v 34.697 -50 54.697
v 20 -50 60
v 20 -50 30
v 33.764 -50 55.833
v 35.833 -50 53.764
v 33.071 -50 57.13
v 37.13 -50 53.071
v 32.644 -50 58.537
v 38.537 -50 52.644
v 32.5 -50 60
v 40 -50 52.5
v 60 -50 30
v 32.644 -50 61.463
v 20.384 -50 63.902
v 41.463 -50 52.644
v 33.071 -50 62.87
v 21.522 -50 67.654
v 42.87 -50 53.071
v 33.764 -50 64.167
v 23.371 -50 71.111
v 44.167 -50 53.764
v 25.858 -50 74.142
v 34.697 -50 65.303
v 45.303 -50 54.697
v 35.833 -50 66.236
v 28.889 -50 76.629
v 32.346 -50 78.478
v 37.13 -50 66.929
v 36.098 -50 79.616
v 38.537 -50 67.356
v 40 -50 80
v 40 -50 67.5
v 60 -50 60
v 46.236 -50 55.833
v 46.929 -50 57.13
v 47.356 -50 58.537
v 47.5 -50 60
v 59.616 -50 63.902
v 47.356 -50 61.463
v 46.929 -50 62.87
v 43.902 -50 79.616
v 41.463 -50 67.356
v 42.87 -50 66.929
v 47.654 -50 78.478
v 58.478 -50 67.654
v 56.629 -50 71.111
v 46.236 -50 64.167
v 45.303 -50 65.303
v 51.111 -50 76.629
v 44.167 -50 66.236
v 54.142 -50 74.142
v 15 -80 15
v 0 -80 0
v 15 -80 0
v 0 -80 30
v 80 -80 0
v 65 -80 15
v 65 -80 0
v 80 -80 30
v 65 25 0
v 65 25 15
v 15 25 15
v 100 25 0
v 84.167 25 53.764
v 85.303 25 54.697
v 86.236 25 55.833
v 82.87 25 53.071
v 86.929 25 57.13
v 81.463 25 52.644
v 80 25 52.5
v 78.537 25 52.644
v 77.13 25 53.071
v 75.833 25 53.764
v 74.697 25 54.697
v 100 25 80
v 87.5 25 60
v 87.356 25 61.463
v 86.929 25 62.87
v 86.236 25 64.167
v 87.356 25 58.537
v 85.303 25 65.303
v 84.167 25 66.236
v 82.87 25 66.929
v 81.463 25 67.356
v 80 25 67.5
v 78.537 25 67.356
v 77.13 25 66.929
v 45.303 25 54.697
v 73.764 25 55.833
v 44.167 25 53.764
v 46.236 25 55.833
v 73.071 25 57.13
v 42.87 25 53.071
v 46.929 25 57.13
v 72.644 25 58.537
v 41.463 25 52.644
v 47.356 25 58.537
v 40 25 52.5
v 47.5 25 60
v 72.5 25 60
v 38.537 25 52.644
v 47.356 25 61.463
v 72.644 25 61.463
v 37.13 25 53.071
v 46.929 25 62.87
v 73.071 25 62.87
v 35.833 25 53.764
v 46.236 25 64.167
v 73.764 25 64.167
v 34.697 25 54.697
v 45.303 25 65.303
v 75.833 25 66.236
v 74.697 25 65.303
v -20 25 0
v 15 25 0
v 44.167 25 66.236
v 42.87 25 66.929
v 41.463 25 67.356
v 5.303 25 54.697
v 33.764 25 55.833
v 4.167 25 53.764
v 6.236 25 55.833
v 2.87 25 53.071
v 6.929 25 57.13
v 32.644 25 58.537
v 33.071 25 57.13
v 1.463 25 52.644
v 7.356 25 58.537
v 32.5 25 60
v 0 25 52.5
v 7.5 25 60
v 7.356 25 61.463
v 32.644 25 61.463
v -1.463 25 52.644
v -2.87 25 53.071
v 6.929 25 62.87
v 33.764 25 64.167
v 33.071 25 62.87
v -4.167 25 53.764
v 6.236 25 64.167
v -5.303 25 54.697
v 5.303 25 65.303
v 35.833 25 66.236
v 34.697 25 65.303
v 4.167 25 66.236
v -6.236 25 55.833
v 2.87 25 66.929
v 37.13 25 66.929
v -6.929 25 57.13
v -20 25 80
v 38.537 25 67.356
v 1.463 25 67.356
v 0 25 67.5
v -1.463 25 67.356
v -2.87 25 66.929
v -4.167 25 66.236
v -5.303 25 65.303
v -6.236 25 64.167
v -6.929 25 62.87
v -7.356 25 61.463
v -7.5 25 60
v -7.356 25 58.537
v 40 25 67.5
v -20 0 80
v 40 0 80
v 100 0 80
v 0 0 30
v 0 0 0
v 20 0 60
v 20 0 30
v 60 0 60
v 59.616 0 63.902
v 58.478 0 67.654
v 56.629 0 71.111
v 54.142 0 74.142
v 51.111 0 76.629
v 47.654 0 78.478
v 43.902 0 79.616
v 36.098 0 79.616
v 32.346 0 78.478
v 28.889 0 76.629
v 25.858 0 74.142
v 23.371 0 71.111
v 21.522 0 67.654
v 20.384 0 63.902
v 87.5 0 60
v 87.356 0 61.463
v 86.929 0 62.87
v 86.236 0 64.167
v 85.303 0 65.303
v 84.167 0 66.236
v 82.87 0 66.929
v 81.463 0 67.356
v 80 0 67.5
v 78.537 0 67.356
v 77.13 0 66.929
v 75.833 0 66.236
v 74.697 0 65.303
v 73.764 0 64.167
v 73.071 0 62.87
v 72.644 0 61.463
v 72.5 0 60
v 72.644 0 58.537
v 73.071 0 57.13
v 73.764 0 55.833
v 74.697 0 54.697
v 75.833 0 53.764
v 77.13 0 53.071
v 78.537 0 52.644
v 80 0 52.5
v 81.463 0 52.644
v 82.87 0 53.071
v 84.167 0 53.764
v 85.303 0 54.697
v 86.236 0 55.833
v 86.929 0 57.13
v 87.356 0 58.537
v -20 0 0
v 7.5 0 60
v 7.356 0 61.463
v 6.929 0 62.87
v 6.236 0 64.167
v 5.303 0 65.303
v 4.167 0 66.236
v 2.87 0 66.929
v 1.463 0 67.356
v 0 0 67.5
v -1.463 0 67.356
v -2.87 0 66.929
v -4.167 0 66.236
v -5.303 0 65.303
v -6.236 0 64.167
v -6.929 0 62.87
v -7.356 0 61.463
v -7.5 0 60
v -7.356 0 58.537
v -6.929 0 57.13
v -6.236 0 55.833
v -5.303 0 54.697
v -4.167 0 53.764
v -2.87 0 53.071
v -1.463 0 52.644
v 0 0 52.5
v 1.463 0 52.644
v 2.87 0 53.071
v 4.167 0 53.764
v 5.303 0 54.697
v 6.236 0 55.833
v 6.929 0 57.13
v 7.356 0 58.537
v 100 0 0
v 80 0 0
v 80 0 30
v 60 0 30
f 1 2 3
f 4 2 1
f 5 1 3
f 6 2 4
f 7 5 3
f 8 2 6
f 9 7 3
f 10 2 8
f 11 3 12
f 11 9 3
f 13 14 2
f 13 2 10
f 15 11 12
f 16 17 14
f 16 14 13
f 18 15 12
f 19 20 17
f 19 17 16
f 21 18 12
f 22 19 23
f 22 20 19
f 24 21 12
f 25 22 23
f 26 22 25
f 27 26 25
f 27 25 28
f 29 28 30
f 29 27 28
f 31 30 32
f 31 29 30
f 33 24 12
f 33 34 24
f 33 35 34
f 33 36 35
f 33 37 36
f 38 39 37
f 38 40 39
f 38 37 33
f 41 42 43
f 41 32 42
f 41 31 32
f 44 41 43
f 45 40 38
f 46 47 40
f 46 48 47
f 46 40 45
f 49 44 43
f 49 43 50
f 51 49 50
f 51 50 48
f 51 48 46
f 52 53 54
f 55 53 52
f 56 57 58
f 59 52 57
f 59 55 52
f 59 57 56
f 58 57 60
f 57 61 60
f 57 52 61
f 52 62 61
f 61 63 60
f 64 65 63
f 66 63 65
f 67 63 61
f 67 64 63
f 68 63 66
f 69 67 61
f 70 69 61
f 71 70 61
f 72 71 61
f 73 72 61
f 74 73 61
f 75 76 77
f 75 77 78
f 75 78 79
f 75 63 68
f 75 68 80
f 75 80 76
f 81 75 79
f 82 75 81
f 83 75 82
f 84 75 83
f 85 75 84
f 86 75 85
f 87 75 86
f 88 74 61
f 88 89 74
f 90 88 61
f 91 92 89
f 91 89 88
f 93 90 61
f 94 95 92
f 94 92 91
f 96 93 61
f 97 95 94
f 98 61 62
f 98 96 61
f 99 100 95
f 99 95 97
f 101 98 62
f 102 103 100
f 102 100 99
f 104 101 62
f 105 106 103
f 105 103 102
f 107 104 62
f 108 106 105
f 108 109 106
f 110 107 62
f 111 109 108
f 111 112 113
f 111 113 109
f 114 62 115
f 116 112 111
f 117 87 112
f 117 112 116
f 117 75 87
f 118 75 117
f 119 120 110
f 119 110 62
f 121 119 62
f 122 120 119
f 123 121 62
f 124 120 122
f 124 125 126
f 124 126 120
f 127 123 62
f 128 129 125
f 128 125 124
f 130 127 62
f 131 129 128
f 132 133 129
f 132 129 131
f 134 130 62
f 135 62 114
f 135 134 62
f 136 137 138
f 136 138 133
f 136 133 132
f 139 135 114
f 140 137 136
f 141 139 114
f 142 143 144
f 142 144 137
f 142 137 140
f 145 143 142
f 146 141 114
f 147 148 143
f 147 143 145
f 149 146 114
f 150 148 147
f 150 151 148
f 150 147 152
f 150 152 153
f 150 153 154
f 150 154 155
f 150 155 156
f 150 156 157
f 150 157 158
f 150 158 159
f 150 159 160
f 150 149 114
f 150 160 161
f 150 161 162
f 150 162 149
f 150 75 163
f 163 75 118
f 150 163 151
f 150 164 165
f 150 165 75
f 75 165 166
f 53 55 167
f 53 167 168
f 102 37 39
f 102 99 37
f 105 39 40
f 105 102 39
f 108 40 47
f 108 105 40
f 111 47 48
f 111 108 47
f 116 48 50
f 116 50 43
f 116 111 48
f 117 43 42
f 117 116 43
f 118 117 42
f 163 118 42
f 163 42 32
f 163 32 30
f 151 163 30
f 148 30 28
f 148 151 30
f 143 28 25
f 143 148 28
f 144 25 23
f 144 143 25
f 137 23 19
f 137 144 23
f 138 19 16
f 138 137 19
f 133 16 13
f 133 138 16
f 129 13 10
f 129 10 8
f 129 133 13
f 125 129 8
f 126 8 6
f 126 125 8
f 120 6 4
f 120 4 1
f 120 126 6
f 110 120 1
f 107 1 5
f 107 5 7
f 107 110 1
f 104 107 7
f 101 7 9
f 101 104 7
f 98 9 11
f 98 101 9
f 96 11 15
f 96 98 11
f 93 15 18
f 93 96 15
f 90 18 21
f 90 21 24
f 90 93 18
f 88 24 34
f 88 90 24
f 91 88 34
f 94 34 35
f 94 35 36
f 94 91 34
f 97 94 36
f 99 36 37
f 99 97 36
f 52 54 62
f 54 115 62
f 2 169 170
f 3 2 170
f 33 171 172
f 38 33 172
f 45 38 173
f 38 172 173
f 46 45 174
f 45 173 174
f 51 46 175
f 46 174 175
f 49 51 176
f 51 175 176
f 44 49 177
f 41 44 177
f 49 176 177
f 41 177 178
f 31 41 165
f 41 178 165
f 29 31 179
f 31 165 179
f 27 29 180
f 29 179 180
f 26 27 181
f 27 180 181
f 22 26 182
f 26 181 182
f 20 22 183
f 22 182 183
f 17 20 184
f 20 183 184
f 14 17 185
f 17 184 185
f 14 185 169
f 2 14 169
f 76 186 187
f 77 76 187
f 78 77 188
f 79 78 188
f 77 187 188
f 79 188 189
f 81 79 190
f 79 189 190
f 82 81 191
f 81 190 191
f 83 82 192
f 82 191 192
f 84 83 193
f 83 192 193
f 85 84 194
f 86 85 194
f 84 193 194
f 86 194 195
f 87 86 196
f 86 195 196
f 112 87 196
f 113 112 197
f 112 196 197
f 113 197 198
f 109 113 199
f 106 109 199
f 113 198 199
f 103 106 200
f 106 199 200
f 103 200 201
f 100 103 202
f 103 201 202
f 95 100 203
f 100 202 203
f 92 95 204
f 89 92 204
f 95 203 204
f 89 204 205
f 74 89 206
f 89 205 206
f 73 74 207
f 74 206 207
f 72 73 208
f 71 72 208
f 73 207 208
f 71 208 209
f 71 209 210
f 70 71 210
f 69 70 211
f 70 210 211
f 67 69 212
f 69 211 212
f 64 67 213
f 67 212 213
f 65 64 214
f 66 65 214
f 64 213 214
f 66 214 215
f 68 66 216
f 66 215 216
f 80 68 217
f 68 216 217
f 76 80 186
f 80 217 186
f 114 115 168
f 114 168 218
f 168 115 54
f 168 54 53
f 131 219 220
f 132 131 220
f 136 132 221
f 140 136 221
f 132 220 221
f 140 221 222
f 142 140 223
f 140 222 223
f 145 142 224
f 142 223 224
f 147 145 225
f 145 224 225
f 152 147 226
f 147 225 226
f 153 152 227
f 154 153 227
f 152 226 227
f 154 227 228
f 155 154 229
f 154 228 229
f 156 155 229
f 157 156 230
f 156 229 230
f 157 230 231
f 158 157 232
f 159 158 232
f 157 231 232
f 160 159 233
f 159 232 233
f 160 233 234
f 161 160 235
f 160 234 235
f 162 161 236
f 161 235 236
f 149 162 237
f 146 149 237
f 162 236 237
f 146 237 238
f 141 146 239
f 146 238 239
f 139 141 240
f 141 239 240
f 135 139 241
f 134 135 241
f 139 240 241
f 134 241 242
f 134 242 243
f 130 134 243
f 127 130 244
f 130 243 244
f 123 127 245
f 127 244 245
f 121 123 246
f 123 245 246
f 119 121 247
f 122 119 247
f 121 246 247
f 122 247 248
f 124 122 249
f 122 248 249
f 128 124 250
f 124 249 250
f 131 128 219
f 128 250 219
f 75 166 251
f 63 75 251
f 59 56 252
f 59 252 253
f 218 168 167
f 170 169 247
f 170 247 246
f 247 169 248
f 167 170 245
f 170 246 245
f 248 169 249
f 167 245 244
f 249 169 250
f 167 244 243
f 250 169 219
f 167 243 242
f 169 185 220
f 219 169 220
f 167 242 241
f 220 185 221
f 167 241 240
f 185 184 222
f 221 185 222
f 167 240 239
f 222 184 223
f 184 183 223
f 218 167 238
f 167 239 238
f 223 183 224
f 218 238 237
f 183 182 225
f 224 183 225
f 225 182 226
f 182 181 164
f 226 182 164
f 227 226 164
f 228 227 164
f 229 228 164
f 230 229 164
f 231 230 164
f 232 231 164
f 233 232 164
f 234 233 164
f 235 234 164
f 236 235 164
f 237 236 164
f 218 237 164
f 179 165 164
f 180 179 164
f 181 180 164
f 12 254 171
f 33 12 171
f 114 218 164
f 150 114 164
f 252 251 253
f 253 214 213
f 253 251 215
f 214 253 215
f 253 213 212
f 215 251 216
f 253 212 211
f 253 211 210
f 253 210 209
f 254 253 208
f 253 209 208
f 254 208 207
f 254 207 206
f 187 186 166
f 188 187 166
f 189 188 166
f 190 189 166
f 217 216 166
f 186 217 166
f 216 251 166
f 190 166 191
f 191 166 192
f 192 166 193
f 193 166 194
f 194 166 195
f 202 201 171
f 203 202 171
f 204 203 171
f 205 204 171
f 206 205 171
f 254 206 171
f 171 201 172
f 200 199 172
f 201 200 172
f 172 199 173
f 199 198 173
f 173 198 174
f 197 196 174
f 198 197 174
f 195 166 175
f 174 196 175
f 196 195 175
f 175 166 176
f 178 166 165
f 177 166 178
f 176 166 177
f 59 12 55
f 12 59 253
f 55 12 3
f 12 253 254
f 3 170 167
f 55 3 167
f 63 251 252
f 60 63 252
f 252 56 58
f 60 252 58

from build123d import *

# Parameters (mm, degrees)
F1_DEPTH  = 80
F3_DEPTH  = 25
F4_R      = 7.5
F5_DEPTH  = 50
F6_R      = 7.5
F7_DEPTH  = 25
F9_W      = 50
F9_H      = 15
F10_DEPTH = 25
F11_R     = 7.5
F12_DEPTH = 25


with BuildPart() as f1:
    # F0 (on Front) → F1 (new body)
    with BuildSketch(Plane.XZ):
        Polygon((0, 30), (0, 0), (15, 0), (15, 15), (65, 15), (65, 0), (80, 0), (80, 30), align=None)
    extrude(amount=F1_DEPTH)

    # F2 (on face) → F3 (join)
    with BuildSketch(Plane(origin=(0, 0, 0), x_dir=(-1, 0, 0), z_dir=(0, 1, 0))):
        Polygon((-100, 0), (0, 0), (20, 0), (20, 80), (-100, 80), align=None)
    extrude(amount=F3_DEPTH)

    # F4 (on face) → F5 (join)
    with BuildSketch(Plane.XZ):
        with BuildLine():
            Line((20, 30), (40, 30))
            Line((40, 30), (60, 30))
            Line((60, 30), (60, 60))
            ThreePointArc((60, 60), (40, 80), (20, 60))
            Line((20, 60), (20, 30))
        make_face()
        with Locations((40, 60)):
            Circle(F4_R, mode=Mode.SUBTRACT)
    extrude(amount=F5_DEPTH)

    # F6 (on face) → F7 (cut, through all)
    with BuildSketch(Plane.XZ):
        with Locations((80, 60)):
            Circle(F6_R)
        with Locations((0, 60)):
            Circle(F6_R)
    extrude(amount=-F7_DEPTH, mode=Mode.SUBTRACT)

    # F9 (on face) → F10 (cut, through all)
    with BuildSketch(Plane.XZ):
        with Locations((40, 7.5)):
            Rectangle(F9_W, F9_H)
    extrude(amount=-F10_DEPTH, mode=Mode.SUBTRACT)

    # F11 (on face) → F12 (cut, through all)
    with BuildSketch(Plane.XZ):
        with Locations((40, 60)):
            Circle(F11_R)
    extrude(amount=-F12_DEPTH, mode=Mode.SUBTRACT)


solid = f1.part
